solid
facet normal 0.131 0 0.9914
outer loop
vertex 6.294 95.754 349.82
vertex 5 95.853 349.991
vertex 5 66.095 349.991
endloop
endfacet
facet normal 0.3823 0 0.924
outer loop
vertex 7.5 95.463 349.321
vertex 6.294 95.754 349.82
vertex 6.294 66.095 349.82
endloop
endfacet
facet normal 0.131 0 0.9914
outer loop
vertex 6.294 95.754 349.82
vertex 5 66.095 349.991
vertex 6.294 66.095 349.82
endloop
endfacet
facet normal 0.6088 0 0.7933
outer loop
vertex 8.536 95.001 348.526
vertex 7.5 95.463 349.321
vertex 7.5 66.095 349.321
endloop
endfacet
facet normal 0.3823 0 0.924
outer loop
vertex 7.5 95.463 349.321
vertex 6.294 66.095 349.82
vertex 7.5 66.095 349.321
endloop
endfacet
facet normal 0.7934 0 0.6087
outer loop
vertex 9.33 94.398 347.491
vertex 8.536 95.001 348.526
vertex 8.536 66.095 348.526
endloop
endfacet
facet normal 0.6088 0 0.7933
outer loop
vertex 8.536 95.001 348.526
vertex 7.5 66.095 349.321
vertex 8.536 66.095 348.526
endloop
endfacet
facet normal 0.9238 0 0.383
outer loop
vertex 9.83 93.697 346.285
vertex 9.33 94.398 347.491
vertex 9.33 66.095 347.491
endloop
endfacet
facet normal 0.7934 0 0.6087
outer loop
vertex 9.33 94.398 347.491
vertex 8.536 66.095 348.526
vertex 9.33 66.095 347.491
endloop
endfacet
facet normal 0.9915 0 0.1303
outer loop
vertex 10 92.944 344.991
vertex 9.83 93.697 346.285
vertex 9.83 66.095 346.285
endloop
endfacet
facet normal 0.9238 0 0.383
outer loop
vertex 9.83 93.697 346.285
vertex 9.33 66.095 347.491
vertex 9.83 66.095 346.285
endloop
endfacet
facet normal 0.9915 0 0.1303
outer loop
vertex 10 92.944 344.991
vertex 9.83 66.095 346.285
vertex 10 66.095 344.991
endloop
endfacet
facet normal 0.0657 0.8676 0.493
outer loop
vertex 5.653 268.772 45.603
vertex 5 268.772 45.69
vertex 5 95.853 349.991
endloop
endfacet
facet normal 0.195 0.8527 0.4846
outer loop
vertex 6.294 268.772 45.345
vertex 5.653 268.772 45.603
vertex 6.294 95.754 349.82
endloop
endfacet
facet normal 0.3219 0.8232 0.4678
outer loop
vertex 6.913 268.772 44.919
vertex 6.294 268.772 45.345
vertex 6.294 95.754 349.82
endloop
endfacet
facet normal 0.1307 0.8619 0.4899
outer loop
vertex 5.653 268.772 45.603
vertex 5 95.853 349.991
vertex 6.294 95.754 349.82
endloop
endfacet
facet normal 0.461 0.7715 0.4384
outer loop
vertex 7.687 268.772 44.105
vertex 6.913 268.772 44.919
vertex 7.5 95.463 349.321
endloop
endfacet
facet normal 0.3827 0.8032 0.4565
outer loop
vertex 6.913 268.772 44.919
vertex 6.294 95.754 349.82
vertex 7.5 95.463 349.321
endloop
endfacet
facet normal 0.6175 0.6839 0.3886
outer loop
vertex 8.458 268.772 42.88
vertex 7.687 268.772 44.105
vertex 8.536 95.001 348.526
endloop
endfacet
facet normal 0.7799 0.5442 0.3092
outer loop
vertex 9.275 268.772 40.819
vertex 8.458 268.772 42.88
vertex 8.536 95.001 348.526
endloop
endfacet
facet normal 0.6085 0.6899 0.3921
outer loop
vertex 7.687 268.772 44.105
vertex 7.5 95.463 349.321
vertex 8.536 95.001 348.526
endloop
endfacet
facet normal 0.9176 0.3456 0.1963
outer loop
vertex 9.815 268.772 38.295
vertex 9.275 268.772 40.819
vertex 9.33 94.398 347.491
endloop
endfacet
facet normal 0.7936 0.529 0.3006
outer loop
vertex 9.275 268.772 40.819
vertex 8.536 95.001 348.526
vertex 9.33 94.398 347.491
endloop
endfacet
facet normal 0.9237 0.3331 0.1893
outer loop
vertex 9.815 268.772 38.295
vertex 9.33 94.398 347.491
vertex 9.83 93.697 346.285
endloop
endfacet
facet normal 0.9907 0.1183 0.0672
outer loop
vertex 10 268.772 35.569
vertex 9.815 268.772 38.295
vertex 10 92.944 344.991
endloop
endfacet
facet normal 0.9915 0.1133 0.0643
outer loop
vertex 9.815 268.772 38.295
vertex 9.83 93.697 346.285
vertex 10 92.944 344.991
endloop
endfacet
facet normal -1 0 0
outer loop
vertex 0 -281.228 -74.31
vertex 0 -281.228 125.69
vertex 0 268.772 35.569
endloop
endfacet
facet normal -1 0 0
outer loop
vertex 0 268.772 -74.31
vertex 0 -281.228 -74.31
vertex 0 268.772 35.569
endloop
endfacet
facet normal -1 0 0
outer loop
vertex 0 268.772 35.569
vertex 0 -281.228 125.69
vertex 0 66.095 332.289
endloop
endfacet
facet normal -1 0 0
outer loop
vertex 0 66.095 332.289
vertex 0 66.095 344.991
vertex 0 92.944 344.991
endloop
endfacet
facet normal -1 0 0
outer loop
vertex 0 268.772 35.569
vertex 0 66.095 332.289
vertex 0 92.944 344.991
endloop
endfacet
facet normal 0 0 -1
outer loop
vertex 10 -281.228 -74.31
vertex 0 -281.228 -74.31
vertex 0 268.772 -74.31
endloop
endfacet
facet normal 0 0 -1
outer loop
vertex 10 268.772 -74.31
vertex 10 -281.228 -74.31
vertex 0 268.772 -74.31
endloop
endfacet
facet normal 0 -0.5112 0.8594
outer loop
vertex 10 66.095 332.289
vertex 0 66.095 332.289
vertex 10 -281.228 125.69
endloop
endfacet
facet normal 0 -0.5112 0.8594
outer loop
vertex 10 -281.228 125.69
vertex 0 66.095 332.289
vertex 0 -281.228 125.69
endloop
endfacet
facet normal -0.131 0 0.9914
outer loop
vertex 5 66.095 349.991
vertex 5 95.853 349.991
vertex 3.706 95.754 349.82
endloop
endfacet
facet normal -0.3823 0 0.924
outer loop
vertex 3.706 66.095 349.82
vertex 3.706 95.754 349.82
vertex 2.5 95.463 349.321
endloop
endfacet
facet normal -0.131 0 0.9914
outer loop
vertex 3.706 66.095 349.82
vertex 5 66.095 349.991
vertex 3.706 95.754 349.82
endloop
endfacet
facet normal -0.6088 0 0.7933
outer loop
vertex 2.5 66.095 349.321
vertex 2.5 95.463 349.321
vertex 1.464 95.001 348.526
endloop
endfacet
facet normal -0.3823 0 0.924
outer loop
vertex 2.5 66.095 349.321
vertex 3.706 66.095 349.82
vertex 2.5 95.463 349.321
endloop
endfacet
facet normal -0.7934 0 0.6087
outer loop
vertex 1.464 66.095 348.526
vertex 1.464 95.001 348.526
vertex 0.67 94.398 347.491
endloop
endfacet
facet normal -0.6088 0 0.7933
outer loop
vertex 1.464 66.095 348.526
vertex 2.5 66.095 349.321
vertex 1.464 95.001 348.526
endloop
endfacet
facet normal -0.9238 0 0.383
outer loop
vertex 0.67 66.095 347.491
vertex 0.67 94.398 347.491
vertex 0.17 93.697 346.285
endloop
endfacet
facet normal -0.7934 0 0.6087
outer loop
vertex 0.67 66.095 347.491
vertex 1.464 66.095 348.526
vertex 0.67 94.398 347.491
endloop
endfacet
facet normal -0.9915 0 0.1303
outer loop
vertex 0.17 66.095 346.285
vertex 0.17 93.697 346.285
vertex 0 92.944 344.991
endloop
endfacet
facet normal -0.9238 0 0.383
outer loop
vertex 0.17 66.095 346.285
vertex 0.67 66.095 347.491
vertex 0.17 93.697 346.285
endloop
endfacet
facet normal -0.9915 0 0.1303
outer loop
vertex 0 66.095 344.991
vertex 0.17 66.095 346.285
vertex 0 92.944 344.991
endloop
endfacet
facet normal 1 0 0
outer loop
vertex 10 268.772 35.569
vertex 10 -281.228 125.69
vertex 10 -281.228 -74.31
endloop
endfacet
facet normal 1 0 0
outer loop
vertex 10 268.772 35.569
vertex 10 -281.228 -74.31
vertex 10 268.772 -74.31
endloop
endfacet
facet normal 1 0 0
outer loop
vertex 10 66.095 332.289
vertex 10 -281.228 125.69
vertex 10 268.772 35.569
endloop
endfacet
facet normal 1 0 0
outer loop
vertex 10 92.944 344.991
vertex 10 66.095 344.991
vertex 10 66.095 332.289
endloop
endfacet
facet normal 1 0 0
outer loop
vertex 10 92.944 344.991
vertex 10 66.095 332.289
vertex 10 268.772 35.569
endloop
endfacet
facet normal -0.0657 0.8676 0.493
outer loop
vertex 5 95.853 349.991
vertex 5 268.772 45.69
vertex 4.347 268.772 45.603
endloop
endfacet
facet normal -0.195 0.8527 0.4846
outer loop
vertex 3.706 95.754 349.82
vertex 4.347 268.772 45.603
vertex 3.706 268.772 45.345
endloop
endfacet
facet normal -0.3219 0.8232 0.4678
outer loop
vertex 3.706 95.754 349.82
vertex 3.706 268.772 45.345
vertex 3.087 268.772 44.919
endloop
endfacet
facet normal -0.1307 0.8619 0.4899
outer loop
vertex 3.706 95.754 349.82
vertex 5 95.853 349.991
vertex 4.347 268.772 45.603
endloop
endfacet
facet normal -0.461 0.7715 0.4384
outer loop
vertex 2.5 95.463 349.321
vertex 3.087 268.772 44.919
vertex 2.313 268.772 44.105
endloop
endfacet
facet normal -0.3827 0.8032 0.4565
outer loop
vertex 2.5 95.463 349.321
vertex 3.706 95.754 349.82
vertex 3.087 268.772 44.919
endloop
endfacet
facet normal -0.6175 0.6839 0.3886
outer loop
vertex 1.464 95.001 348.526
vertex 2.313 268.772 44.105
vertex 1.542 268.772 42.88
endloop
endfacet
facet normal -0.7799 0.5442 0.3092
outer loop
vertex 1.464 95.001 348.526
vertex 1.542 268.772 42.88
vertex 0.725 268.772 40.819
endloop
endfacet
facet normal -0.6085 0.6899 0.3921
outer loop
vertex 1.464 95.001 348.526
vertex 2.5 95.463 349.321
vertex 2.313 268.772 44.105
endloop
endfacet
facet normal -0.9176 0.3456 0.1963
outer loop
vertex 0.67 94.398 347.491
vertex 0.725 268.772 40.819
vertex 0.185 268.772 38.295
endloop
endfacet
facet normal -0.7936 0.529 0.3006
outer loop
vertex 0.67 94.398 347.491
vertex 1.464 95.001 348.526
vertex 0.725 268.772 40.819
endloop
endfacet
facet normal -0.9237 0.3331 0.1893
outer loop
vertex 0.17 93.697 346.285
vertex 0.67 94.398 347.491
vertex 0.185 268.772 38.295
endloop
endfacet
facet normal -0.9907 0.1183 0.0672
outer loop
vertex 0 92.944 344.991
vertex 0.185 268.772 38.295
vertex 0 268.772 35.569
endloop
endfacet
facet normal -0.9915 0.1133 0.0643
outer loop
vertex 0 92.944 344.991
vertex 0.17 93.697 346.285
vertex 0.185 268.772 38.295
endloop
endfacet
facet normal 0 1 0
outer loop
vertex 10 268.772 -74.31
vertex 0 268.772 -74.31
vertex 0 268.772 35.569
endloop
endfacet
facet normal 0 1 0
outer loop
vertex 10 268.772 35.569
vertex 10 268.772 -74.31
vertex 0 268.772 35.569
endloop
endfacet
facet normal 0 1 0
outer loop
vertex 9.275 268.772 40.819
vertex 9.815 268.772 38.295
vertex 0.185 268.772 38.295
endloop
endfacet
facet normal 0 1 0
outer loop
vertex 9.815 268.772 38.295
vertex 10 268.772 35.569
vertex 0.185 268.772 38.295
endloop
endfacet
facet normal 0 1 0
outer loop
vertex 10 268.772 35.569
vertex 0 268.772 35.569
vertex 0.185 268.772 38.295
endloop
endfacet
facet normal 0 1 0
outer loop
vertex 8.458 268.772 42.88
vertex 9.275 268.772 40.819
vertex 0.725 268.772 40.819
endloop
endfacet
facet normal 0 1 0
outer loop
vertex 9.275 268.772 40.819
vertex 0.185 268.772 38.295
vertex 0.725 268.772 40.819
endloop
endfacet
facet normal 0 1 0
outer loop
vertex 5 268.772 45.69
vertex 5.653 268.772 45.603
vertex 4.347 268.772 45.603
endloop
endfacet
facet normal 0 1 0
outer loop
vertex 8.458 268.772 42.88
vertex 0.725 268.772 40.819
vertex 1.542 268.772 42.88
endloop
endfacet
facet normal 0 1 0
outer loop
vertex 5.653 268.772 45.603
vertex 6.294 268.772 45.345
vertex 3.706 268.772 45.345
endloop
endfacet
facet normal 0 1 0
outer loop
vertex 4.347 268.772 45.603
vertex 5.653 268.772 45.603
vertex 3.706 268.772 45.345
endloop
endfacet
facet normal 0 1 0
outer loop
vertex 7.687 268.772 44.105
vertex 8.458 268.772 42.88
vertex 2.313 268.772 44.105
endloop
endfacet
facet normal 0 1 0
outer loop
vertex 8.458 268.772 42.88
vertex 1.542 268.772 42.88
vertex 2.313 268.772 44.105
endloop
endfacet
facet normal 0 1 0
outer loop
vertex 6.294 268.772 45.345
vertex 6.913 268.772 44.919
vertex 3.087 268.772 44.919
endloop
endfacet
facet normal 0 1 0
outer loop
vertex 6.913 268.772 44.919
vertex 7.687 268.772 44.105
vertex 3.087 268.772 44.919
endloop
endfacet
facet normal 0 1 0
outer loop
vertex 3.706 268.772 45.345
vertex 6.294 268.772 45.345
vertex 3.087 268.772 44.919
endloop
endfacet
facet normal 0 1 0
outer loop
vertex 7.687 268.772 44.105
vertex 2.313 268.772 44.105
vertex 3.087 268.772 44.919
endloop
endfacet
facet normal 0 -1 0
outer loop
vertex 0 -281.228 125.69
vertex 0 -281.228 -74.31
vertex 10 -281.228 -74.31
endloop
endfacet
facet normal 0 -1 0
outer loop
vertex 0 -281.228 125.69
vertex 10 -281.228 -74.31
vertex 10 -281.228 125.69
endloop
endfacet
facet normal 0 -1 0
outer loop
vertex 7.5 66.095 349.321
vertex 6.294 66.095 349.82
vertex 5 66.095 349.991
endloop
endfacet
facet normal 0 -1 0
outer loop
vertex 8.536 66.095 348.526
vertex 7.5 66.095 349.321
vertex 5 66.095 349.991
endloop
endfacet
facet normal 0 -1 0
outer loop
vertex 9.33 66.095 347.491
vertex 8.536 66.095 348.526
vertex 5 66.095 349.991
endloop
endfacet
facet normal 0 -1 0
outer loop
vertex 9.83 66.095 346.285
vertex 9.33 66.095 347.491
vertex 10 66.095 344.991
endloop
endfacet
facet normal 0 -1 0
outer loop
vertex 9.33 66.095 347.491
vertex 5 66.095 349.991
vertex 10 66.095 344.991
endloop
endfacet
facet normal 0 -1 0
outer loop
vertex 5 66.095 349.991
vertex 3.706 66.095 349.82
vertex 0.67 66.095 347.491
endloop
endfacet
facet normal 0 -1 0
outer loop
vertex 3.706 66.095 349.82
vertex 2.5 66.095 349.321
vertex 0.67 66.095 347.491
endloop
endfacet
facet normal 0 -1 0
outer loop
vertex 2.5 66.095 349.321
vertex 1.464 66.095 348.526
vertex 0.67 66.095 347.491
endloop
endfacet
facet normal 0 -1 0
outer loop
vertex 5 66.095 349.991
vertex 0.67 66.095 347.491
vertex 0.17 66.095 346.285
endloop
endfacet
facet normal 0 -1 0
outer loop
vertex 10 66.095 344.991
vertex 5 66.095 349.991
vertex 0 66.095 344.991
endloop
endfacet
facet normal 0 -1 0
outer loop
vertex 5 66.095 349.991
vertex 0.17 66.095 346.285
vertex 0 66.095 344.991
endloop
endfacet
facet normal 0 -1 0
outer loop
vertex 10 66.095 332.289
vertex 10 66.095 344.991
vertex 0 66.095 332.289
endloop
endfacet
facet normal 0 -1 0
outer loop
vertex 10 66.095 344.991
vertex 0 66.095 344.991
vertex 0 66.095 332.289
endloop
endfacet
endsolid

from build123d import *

# Parameters (mm, degrees)
F0_W     = 113.7219756842
F0_H     = 120
F0_W_2   = 107.0308029652
F0_H_2   = 200
F1_DEPTH = 10
F2_R     = 4.99999


# Not quite as in the source:
# - a fillet or chamfer is up to 0.001 mm smaller than in the source, because OpenCascade refuses the exact size


with BuildPart() as f1:
    # F0 (on Right) → F1 (new body)
    with BuildSketch(Plane.YZ):
        with Locations((211.910609901, -14.3104368448)):
            Rectangle(F0_W, F0_H)
        Polygon((95.8531785295, -74.3104368448), (155.0496220589, -74.3104368448), (155.0496220589, 45.6895631552), (268.771597743, 45.6895631552), (95.8531785295, 349.9907631145), align=None)
        Polygon((66.0946071148, -74.3104368448), (95.8531785295, -74.3104368448), (95.8531785295, 349.9907631145), (66.0946071148, 332.2893329267), align=None)
        Polygon((66.0946071148, 332.2893329267), (95.8531785295, 349.9907631145), (66.0946071148, 349.9907631145), align=None)
        Polygon((-174.1975992918, -74.3104368448), (66.0946071148, -74.3104368448), (66.0946071148, 332.2893329267), (-281.228402257, 125.6895631552), (-174.1975992918, 125.6895631552), align=None)
        with Locations((-227.7130007744, 25.6895631552)):
            Rectangle(F0_W_2, F0_H_2)
    extrude(amount=F1_DEPTH)

    # F2 (radius 5 in the source; OpenCascade refuses exactly that, so slightly less here)
    f2_edges = [f1.edges().sort_by_distance(p)[0] for p in [
        (10, 182.312388, 197.840163),
        (0, 182.312388, 197.840163),
        (10, 80.973893, 349.990763),
        (0, 80.973893, 349.990763),
    ]]
    fillet(f2_edges, radius=F2_R)


solid = f1.part
